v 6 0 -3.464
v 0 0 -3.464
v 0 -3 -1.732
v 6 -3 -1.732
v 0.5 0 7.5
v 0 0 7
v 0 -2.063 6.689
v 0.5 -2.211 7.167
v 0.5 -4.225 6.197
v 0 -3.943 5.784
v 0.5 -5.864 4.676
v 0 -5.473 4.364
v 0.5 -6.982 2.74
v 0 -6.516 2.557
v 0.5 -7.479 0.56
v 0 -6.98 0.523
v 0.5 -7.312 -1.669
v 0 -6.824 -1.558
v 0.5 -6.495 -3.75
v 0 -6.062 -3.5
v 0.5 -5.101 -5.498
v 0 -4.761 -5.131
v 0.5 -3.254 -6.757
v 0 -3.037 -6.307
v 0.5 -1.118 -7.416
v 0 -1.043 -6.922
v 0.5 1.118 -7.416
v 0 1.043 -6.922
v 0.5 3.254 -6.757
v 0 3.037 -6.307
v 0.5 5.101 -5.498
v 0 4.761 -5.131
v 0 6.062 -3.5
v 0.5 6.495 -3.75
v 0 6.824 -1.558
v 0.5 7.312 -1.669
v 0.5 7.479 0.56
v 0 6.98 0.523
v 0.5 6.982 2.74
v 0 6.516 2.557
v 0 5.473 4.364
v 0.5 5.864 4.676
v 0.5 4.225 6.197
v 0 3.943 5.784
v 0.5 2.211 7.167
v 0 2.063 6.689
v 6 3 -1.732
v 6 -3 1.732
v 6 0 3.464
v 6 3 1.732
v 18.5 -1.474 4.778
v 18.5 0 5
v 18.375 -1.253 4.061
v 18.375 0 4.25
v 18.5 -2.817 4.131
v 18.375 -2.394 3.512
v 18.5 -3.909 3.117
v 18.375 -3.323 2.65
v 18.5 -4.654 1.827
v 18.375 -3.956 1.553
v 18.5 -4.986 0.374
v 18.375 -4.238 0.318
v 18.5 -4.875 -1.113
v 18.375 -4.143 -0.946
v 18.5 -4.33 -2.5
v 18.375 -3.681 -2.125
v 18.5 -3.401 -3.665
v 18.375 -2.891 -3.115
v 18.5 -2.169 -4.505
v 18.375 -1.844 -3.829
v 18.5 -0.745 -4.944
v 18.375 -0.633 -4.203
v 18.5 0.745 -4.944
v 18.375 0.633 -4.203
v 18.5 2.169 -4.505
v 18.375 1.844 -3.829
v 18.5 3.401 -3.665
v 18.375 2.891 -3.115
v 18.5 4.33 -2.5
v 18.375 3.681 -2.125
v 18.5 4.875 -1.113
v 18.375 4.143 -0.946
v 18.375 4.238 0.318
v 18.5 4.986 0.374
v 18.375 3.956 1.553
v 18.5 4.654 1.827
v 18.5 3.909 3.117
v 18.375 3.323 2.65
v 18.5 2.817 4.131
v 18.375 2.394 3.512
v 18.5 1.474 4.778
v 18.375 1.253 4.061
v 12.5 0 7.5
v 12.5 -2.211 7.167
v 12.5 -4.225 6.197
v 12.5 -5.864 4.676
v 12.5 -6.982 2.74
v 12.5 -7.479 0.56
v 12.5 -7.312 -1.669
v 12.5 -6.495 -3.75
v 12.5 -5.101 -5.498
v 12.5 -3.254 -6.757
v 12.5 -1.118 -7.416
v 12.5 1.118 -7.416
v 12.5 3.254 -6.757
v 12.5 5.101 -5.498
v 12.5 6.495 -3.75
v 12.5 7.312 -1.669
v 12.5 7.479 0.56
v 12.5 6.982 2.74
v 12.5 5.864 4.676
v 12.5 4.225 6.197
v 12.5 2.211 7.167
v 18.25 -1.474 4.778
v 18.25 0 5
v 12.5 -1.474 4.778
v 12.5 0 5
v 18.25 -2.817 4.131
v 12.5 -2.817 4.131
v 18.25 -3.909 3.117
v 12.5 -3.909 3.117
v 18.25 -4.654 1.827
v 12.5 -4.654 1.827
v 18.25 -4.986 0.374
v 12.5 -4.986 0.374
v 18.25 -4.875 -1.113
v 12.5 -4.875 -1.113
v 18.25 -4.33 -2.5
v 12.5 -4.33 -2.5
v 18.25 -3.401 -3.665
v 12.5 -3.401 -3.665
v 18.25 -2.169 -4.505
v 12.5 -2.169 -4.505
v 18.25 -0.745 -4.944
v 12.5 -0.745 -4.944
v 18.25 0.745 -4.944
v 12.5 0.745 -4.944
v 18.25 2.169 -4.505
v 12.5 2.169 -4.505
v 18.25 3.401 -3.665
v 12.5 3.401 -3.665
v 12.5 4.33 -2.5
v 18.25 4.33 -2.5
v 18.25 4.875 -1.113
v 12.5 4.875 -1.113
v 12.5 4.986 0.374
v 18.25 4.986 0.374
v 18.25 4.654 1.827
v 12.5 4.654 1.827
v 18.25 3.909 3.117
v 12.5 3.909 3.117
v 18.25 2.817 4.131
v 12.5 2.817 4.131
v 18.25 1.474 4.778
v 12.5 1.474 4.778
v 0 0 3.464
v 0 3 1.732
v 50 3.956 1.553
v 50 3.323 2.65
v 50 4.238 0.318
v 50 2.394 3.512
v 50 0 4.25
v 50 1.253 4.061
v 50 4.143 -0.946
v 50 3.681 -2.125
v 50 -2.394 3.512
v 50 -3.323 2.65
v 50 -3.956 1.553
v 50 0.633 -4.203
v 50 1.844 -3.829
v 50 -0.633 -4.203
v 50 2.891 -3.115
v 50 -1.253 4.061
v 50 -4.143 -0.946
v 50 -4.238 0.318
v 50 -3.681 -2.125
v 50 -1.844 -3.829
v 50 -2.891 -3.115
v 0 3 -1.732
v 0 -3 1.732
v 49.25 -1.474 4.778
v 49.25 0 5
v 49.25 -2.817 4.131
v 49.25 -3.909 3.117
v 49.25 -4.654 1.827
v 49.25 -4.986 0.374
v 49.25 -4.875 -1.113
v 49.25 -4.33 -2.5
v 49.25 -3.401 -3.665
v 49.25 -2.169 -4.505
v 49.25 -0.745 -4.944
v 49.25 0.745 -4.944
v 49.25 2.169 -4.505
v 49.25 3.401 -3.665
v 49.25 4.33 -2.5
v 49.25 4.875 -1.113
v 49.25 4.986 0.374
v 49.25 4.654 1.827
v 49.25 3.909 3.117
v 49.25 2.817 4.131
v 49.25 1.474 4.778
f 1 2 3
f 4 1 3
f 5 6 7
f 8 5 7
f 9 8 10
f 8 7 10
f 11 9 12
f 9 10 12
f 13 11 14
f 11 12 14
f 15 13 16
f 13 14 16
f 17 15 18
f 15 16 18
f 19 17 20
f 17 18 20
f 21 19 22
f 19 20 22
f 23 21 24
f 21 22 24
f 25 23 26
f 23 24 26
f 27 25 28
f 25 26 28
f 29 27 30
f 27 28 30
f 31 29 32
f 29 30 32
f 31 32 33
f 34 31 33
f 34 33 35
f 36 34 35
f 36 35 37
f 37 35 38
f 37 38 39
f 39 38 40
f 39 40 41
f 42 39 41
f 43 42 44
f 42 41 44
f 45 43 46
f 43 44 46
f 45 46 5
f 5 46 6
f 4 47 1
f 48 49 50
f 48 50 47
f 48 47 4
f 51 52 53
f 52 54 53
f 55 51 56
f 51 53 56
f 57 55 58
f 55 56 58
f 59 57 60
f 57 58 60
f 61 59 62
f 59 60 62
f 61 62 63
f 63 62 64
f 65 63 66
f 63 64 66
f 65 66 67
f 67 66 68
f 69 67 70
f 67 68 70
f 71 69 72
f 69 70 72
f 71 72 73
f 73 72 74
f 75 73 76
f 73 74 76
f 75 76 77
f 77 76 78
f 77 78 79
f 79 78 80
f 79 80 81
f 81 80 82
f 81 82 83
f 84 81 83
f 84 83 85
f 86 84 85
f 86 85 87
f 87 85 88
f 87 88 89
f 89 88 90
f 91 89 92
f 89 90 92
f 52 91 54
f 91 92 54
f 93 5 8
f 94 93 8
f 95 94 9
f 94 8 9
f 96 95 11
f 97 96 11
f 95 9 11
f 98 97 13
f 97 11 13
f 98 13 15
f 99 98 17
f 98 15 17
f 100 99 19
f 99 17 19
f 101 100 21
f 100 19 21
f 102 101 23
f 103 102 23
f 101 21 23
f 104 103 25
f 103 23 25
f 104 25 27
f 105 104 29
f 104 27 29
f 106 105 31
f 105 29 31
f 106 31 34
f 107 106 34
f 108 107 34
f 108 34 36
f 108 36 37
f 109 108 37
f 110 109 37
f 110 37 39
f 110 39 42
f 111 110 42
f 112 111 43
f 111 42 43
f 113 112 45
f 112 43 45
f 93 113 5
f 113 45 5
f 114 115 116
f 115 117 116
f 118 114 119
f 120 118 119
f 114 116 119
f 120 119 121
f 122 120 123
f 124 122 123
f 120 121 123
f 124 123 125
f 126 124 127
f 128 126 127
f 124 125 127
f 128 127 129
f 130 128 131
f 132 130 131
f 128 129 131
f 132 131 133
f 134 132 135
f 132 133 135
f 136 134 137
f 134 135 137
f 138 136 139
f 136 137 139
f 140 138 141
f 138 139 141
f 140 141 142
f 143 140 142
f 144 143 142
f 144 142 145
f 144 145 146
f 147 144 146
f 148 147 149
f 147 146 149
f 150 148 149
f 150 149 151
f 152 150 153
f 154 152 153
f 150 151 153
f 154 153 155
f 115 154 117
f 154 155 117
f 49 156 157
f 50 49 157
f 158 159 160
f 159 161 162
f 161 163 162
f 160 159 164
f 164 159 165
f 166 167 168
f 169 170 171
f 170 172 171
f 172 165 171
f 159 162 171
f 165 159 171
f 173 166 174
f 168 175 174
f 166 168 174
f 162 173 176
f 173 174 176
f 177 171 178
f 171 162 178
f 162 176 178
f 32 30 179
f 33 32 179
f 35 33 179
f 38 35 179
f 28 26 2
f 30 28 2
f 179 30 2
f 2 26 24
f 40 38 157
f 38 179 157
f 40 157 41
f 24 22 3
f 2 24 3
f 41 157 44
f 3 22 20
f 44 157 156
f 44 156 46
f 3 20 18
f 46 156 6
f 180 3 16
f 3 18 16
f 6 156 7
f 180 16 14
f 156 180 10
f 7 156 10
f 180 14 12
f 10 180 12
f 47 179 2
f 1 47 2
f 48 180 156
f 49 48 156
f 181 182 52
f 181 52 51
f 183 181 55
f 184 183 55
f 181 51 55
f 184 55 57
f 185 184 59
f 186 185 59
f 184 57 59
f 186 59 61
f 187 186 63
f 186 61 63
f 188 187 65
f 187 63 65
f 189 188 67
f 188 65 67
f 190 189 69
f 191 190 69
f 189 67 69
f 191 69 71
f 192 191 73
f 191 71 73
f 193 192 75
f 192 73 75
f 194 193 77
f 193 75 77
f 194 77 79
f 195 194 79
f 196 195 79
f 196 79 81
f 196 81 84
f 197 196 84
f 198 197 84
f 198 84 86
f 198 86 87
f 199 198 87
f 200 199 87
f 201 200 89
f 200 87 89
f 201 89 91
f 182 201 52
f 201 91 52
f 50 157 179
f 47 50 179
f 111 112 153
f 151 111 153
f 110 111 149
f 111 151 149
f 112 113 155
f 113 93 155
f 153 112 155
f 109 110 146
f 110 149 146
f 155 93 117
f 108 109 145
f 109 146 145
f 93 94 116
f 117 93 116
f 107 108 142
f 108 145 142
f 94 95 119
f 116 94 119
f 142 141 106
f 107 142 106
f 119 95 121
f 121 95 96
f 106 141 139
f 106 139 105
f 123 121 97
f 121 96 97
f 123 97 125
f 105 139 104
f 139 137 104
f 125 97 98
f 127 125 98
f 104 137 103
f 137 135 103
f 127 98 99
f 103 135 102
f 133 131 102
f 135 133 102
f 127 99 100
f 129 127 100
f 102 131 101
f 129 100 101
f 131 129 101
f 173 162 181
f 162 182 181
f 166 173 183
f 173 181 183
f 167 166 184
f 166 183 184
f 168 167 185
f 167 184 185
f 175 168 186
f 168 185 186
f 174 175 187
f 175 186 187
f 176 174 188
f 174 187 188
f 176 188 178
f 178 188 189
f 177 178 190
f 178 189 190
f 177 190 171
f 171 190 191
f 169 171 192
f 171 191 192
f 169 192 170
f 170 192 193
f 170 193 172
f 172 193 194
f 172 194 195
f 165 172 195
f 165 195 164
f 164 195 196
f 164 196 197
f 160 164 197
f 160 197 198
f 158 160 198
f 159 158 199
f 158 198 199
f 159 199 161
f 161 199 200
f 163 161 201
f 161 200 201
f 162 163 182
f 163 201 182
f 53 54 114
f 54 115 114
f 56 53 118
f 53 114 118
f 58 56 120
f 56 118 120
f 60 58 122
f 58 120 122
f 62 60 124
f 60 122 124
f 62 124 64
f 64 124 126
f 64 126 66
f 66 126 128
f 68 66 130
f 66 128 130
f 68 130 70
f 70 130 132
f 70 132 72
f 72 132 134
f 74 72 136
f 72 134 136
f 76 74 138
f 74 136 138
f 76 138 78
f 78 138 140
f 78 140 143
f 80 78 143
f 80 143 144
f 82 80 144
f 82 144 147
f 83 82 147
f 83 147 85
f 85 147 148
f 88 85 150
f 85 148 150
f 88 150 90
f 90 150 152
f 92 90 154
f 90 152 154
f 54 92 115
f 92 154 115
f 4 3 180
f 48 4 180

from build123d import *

# Parameters (mm, degrees)
F2_SIZE  = 0.5
F4_DEPTH = 6


with BuildPart() as f1:
    # F0 (on Front) → F1 (revolve)
    with BuildSketch(Plane.XZ):
        Polygon((12.5, 5), (12.5, 7.5), (0, 7.5), (0, 0), (50, 0), (50, 4.25), (49.25, 5), (18.5, 5), (18.375, 4.25), (18.25, 5), align=None)
    revolve(axis=Axis((25, 0, 0), (1, 0, 0)))

    # F2
    f2_edges = [f1.edges().sort_by_distance(p)[0] for p in [
        (0, 0, -7.5),
    ]]
    chamfer(f2_edges, length=F2_SIZE)

    # F3 (on face) → F4 (cut)
    with BuildSketch(Plane(origin=(0, 0, 0), x_dir=(0, -1, 0), z_dir=(-1, 0, 0))):
        Polygon((0, -3.464102), (3, -1.732051), (3, 1.732051), (0, 3.464102), (-3, 1.732051), (-3, -1.732051), align=None)
    extrude(amount=-F4_DEPTH, mode=Mode.SUBTRACT)


solid = f1.part
